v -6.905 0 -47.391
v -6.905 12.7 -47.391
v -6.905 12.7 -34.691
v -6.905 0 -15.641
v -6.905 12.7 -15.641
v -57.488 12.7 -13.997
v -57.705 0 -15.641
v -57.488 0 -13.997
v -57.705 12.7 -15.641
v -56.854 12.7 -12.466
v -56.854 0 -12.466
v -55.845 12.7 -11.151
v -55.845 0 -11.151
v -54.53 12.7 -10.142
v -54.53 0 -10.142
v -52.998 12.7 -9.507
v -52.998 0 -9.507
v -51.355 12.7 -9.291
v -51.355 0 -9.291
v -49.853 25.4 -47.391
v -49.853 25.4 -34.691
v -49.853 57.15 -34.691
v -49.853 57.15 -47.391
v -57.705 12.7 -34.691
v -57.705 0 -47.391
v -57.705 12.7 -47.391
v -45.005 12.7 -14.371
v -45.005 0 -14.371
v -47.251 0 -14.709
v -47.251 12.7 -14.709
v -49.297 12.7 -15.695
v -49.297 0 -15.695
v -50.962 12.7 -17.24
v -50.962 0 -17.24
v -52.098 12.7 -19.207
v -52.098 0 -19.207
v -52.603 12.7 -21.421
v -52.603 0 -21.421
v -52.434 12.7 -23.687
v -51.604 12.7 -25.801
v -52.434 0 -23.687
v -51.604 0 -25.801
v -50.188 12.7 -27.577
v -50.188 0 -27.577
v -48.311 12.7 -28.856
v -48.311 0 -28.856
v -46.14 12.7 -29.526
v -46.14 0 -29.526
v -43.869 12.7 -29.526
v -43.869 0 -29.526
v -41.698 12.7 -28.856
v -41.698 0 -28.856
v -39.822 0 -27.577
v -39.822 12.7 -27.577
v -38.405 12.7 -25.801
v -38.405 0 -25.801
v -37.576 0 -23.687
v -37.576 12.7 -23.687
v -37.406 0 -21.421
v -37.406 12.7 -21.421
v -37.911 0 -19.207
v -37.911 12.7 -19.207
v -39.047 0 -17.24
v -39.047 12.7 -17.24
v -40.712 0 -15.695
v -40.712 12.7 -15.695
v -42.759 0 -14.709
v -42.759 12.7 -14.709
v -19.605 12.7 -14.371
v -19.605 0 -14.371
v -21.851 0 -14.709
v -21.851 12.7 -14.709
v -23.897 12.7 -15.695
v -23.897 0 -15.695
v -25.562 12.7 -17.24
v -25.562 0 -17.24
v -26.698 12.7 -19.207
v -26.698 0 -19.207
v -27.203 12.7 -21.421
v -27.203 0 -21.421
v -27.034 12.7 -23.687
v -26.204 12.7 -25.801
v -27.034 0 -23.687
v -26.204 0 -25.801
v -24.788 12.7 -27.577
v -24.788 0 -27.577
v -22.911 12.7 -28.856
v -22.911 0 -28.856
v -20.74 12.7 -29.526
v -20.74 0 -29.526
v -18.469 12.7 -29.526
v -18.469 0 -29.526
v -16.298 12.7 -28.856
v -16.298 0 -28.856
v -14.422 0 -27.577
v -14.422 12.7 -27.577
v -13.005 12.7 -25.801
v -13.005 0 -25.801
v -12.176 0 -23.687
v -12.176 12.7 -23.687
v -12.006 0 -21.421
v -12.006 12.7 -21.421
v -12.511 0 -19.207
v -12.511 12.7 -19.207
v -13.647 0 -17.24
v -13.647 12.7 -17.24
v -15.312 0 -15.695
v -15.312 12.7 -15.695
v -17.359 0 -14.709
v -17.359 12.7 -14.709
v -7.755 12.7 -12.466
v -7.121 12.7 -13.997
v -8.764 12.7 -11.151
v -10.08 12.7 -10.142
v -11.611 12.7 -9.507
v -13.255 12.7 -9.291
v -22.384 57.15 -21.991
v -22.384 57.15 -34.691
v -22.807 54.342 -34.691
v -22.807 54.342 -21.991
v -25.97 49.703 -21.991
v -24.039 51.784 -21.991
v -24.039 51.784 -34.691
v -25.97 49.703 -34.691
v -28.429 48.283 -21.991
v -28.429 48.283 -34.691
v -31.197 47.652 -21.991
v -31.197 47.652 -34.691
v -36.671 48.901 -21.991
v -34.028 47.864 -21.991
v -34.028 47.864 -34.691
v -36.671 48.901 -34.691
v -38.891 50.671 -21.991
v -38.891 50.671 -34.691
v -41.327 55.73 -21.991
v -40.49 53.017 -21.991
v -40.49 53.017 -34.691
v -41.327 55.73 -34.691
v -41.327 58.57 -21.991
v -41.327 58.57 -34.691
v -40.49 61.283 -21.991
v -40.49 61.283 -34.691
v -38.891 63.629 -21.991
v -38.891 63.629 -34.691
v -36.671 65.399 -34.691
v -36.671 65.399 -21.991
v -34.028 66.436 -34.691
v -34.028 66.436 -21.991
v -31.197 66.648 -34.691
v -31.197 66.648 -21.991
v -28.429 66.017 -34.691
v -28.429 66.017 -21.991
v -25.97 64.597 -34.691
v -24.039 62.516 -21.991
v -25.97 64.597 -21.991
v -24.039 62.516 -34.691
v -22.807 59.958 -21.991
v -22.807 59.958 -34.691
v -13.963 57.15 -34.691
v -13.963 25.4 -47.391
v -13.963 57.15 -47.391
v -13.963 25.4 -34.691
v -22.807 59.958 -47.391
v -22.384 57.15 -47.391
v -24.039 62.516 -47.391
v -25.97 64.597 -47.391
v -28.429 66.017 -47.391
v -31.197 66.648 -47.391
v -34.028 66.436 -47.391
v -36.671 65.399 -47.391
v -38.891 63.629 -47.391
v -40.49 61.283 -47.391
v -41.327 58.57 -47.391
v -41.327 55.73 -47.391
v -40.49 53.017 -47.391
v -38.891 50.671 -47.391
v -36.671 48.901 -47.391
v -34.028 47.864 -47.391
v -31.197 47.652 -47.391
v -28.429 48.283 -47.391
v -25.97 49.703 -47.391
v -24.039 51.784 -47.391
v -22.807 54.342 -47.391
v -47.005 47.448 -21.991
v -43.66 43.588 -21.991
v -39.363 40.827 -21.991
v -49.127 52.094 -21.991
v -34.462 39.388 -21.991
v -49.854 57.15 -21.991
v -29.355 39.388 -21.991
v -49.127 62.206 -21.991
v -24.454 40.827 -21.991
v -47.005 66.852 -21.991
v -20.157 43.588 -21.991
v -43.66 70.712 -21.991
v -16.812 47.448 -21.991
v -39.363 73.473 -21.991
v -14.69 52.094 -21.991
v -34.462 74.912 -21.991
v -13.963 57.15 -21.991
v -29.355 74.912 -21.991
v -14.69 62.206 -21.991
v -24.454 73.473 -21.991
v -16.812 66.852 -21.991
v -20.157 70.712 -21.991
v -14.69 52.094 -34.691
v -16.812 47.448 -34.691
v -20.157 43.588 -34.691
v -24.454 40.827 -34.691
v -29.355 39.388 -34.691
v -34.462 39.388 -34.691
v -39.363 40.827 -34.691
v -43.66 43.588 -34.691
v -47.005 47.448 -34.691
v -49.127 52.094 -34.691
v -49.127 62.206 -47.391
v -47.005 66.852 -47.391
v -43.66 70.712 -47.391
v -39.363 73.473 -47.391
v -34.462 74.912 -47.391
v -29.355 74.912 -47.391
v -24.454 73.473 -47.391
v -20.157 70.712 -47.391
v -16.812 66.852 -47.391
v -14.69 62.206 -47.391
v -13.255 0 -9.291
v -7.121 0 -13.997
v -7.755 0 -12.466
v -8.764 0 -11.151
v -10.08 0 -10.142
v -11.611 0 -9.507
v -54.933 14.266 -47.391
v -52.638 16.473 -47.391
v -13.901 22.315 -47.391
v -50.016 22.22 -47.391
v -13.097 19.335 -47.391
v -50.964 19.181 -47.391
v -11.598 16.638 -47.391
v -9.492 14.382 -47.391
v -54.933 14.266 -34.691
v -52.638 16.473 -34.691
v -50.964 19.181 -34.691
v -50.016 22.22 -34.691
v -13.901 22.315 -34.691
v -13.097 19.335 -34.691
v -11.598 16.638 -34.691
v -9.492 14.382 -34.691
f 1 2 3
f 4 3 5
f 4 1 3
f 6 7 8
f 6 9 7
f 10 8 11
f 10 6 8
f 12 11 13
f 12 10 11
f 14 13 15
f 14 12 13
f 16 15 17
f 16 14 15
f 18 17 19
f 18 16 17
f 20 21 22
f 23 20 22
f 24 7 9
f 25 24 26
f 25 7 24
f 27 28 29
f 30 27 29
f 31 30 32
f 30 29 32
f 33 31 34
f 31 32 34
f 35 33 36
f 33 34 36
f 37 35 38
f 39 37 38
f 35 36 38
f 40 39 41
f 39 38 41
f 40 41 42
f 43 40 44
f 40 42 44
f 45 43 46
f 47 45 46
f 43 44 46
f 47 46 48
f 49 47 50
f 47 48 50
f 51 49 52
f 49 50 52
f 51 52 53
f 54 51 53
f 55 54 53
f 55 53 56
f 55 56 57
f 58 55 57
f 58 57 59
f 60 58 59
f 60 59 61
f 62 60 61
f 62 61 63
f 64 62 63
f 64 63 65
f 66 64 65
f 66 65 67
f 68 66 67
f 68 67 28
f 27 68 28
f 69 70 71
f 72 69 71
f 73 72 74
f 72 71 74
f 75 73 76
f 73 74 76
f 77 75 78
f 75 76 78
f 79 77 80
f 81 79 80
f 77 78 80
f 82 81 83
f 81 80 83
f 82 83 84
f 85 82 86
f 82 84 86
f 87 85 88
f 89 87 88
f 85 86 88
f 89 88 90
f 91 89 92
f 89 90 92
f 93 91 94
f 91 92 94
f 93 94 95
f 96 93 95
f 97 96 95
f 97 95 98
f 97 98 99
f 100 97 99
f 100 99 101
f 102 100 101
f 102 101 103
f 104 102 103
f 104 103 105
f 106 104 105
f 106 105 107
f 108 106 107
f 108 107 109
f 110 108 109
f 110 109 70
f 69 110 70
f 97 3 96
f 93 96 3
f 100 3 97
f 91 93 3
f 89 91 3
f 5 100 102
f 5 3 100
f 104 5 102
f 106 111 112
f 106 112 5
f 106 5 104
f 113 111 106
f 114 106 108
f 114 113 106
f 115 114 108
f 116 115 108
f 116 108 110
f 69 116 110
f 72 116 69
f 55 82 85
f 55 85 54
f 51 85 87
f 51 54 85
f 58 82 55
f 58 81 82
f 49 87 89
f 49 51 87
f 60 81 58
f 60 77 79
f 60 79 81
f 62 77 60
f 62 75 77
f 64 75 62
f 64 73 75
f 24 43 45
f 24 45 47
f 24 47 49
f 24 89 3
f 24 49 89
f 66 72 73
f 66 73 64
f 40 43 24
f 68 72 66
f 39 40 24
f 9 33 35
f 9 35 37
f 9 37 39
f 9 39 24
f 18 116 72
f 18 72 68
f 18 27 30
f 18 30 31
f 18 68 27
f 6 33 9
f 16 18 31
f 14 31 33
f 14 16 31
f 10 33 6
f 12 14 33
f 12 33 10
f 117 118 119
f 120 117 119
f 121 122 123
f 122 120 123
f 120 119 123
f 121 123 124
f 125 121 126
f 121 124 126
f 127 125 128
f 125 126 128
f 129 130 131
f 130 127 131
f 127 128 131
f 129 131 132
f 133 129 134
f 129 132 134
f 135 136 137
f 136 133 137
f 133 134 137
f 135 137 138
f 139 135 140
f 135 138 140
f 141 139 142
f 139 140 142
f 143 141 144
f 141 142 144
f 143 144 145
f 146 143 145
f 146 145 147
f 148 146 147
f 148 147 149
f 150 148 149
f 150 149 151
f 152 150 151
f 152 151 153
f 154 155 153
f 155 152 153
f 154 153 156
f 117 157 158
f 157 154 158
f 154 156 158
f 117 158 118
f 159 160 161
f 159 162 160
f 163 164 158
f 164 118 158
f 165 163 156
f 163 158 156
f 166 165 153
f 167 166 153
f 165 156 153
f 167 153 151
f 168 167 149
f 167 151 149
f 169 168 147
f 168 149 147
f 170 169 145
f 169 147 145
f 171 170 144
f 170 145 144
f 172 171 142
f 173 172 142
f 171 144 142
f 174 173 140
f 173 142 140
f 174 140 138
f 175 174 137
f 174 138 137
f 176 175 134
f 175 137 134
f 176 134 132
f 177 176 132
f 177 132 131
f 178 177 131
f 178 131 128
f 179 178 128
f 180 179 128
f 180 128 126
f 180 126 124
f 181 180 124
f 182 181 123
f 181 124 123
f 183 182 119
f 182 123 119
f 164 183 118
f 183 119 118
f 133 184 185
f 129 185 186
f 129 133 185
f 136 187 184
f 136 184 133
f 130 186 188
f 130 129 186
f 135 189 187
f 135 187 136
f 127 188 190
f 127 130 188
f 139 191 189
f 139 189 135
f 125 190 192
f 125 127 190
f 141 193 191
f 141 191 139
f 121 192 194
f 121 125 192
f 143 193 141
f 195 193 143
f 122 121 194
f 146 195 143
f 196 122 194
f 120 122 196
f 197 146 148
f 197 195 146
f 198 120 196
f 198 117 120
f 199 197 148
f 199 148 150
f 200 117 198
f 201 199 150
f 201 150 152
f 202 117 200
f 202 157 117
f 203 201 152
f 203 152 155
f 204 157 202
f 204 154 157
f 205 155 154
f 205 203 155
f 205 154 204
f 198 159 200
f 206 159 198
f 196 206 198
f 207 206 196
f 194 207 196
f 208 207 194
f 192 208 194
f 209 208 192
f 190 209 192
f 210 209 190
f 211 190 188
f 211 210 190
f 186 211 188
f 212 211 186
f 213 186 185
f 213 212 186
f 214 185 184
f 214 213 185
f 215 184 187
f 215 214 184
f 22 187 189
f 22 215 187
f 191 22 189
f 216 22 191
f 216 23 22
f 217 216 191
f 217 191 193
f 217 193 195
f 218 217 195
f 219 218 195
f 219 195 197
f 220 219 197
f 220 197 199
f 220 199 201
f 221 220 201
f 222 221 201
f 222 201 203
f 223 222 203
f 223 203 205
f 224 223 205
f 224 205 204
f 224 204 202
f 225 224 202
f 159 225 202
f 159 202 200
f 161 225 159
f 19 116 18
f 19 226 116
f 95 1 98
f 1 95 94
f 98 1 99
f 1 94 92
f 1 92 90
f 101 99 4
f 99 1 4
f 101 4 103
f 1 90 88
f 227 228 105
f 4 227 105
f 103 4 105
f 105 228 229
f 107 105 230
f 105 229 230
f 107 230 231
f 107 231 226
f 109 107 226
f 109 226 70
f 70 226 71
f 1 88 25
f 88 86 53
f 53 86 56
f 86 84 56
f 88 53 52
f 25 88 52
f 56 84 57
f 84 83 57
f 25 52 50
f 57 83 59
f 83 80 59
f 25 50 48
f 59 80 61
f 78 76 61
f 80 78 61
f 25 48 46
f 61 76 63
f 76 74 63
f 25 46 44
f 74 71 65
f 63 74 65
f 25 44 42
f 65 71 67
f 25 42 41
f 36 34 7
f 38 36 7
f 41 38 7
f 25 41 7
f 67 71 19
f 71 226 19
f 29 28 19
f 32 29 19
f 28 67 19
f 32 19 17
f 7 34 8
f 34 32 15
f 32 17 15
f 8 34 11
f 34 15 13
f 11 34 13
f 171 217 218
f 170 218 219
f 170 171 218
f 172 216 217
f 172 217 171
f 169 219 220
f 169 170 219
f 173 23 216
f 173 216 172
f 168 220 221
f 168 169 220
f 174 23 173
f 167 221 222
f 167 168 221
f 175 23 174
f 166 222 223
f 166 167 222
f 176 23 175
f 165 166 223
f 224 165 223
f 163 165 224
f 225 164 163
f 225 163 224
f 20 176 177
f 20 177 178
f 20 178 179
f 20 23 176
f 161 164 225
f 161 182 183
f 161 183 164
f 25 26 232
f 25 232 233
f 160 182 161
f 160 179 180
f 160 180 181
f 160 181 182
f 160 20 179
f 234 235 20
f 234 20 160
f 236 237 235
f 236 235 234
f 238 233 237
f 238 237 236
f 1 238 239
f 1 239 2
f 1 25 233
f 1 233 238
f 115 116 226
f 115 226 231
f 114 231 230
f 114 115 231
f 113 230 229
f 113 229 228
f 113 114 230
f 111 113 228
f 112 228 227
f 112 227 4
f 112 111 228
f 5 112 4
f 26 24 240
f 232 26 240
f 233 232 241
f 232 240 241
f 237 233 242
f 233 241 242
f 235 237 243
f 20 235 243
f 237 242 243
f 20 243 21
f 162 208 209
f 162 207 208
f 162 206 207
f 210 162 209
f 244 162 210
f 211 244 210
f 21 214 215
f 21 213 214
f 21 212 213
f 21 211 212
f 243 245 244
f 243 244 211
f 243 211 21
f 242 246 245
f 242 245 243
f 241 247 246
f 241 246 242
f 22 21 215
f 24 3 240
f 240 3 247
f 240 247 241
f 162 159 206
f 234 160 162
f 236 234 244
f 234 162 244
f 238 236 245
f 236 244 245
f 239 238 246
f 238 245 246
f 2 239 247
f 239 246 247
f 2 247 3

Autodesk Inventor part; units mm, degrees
ref_plane "YZ Plane" through (0, 0, 0) normal (1, 0, 0) x (0, 1, 0)
ref_plane "XZ Plane" through (0, 0, 0) normal (0, 1, 0) x (-1, 0, 0)
ref_plane "XY Plane" through (0, 0, 0) normal (0, 0, 1) x (1, 0, 0)
sketch "Sketch1" plane through (0, 0, 0) normal (0, 1, 0) x (-1, 0, 0)
  line L0 (6.9046, -9.2909) -> (57.7046, -9.2909)
  line L1 (57.7046, -9.2909) -> (57.7046, -47.3909)
  line L2 (57.7046, -47.3909) -> (6.9046, -47.3909)
  line L3 (6.9046, -47.3909) -> (6.9046, -9.2909)
  point P0 (0, 0)
  dimension "d0" = 50.8
  dimension "d1" = 38.1
extrude "Extrusion1" add sketch "Sketch1" along normal blind 12.7
fillet "Fillet1" radius 6.35 2 edges at (-6.9046, 6.35, -9.2909) (-57.7046, 6.35, -9.2909)
sketch "Sketch2" plane through (0, 12.7, 0) normal (0, 1, 0) x (1, 0, 0)
  point P0 (0, 0)
  point P1 (-19.6046, 21.9909)
  point P2 (-45.0046, 21.9909)
sketch "Sketch3" plane through (0, 12.7, 0) normal (0, 1, 0) x (1, 0, 0)
  line L0 (-6.9046, 47.3909) -> (-6.9046, 15.6409) projected
  line L1 (-57.7046, 47.3909) -> (-6.9046, 47.3909)
  line L2 (-6.9046, 47.3909) -> (-6.9046, 34.6909)
  line L3 (-6.9046, 34.6909) -> (-57.7046, 34.6909)
  line L4 (-57.7046, 34.6909) -> (-57.7046, 47.3909)
  point P0 (0, 0)
  dimension "d16" = 12.7
extrude "Extrusion2" add sketch "Sketch3" along normal blind 63.5
sketch "Sketch4" plane through (-57.7046, 12.7, -34.6909) normal (0, 0, 1) x (1, 0, 0)
  line L0 (0, 0) -> (6.35, 0) projected
  arc A0 (43.7412, 12.7) -> (50.8, 0) centre (56.3756, 11.4106) ccw
  line L1 (43.7412, 12.7) -> (43.7412, 44.45)
  line L2 (44.45, 0) -> (50.8, 0) projected
  arc A1 (0, 0) -> (7.8514, 12.7) centre (-4.8133, 11.7526) ccw
  line L3 (7.8514, 12.7) -> (7.8514, 44.45)
  circle A2 centre (25.7961, 44.45) radius 17.9451
  circle A3 centre (25.7961, 44.45) radius 9.525
  line L4 (0, 0) -> (50.8, 0)
  arc A4 (43.7412, 44.45) -> (7.8514, 44.45) centre (25.7963, 44.45) ccw
  arc A5 (7.8514, 44.45) -> (43.7412, 44.45) centre (25.7963, 44.45) ccw
  line L5 (0, 0) -> (0, 63.5)
  line L6 (0, -12.7) -> (0, 63.5) projected
  line L7 (0, 63.5) -> (50.8, 63.5)
  line L8 (50.8, 63.5) -> (50.8, 0)
  line L9 (50.8, -12.7) -> (50.8, 63.5) projected
  point P0 (57.7046, -12.7)
extrude "Extrusion3" cut sketch "Sketch4" against normal blind 25.4 contours L5 L7 L8 A0 L1 A2 L3 A1
extrude "Extrusion4" cut sketch "Sketch4" against normal blind 25.4 contours A3
extrude "Extrusion5" add sketch "Sketch4" along normal blind 12.7 contours A2
hole "Hole2" at (-19.6046, 12.7, -21.9909) at (-45.0046, 12.7, -21.9909) direction (0, -1, 0) diameter 15.24 end through all
properties part number "7.1 Part 5"
